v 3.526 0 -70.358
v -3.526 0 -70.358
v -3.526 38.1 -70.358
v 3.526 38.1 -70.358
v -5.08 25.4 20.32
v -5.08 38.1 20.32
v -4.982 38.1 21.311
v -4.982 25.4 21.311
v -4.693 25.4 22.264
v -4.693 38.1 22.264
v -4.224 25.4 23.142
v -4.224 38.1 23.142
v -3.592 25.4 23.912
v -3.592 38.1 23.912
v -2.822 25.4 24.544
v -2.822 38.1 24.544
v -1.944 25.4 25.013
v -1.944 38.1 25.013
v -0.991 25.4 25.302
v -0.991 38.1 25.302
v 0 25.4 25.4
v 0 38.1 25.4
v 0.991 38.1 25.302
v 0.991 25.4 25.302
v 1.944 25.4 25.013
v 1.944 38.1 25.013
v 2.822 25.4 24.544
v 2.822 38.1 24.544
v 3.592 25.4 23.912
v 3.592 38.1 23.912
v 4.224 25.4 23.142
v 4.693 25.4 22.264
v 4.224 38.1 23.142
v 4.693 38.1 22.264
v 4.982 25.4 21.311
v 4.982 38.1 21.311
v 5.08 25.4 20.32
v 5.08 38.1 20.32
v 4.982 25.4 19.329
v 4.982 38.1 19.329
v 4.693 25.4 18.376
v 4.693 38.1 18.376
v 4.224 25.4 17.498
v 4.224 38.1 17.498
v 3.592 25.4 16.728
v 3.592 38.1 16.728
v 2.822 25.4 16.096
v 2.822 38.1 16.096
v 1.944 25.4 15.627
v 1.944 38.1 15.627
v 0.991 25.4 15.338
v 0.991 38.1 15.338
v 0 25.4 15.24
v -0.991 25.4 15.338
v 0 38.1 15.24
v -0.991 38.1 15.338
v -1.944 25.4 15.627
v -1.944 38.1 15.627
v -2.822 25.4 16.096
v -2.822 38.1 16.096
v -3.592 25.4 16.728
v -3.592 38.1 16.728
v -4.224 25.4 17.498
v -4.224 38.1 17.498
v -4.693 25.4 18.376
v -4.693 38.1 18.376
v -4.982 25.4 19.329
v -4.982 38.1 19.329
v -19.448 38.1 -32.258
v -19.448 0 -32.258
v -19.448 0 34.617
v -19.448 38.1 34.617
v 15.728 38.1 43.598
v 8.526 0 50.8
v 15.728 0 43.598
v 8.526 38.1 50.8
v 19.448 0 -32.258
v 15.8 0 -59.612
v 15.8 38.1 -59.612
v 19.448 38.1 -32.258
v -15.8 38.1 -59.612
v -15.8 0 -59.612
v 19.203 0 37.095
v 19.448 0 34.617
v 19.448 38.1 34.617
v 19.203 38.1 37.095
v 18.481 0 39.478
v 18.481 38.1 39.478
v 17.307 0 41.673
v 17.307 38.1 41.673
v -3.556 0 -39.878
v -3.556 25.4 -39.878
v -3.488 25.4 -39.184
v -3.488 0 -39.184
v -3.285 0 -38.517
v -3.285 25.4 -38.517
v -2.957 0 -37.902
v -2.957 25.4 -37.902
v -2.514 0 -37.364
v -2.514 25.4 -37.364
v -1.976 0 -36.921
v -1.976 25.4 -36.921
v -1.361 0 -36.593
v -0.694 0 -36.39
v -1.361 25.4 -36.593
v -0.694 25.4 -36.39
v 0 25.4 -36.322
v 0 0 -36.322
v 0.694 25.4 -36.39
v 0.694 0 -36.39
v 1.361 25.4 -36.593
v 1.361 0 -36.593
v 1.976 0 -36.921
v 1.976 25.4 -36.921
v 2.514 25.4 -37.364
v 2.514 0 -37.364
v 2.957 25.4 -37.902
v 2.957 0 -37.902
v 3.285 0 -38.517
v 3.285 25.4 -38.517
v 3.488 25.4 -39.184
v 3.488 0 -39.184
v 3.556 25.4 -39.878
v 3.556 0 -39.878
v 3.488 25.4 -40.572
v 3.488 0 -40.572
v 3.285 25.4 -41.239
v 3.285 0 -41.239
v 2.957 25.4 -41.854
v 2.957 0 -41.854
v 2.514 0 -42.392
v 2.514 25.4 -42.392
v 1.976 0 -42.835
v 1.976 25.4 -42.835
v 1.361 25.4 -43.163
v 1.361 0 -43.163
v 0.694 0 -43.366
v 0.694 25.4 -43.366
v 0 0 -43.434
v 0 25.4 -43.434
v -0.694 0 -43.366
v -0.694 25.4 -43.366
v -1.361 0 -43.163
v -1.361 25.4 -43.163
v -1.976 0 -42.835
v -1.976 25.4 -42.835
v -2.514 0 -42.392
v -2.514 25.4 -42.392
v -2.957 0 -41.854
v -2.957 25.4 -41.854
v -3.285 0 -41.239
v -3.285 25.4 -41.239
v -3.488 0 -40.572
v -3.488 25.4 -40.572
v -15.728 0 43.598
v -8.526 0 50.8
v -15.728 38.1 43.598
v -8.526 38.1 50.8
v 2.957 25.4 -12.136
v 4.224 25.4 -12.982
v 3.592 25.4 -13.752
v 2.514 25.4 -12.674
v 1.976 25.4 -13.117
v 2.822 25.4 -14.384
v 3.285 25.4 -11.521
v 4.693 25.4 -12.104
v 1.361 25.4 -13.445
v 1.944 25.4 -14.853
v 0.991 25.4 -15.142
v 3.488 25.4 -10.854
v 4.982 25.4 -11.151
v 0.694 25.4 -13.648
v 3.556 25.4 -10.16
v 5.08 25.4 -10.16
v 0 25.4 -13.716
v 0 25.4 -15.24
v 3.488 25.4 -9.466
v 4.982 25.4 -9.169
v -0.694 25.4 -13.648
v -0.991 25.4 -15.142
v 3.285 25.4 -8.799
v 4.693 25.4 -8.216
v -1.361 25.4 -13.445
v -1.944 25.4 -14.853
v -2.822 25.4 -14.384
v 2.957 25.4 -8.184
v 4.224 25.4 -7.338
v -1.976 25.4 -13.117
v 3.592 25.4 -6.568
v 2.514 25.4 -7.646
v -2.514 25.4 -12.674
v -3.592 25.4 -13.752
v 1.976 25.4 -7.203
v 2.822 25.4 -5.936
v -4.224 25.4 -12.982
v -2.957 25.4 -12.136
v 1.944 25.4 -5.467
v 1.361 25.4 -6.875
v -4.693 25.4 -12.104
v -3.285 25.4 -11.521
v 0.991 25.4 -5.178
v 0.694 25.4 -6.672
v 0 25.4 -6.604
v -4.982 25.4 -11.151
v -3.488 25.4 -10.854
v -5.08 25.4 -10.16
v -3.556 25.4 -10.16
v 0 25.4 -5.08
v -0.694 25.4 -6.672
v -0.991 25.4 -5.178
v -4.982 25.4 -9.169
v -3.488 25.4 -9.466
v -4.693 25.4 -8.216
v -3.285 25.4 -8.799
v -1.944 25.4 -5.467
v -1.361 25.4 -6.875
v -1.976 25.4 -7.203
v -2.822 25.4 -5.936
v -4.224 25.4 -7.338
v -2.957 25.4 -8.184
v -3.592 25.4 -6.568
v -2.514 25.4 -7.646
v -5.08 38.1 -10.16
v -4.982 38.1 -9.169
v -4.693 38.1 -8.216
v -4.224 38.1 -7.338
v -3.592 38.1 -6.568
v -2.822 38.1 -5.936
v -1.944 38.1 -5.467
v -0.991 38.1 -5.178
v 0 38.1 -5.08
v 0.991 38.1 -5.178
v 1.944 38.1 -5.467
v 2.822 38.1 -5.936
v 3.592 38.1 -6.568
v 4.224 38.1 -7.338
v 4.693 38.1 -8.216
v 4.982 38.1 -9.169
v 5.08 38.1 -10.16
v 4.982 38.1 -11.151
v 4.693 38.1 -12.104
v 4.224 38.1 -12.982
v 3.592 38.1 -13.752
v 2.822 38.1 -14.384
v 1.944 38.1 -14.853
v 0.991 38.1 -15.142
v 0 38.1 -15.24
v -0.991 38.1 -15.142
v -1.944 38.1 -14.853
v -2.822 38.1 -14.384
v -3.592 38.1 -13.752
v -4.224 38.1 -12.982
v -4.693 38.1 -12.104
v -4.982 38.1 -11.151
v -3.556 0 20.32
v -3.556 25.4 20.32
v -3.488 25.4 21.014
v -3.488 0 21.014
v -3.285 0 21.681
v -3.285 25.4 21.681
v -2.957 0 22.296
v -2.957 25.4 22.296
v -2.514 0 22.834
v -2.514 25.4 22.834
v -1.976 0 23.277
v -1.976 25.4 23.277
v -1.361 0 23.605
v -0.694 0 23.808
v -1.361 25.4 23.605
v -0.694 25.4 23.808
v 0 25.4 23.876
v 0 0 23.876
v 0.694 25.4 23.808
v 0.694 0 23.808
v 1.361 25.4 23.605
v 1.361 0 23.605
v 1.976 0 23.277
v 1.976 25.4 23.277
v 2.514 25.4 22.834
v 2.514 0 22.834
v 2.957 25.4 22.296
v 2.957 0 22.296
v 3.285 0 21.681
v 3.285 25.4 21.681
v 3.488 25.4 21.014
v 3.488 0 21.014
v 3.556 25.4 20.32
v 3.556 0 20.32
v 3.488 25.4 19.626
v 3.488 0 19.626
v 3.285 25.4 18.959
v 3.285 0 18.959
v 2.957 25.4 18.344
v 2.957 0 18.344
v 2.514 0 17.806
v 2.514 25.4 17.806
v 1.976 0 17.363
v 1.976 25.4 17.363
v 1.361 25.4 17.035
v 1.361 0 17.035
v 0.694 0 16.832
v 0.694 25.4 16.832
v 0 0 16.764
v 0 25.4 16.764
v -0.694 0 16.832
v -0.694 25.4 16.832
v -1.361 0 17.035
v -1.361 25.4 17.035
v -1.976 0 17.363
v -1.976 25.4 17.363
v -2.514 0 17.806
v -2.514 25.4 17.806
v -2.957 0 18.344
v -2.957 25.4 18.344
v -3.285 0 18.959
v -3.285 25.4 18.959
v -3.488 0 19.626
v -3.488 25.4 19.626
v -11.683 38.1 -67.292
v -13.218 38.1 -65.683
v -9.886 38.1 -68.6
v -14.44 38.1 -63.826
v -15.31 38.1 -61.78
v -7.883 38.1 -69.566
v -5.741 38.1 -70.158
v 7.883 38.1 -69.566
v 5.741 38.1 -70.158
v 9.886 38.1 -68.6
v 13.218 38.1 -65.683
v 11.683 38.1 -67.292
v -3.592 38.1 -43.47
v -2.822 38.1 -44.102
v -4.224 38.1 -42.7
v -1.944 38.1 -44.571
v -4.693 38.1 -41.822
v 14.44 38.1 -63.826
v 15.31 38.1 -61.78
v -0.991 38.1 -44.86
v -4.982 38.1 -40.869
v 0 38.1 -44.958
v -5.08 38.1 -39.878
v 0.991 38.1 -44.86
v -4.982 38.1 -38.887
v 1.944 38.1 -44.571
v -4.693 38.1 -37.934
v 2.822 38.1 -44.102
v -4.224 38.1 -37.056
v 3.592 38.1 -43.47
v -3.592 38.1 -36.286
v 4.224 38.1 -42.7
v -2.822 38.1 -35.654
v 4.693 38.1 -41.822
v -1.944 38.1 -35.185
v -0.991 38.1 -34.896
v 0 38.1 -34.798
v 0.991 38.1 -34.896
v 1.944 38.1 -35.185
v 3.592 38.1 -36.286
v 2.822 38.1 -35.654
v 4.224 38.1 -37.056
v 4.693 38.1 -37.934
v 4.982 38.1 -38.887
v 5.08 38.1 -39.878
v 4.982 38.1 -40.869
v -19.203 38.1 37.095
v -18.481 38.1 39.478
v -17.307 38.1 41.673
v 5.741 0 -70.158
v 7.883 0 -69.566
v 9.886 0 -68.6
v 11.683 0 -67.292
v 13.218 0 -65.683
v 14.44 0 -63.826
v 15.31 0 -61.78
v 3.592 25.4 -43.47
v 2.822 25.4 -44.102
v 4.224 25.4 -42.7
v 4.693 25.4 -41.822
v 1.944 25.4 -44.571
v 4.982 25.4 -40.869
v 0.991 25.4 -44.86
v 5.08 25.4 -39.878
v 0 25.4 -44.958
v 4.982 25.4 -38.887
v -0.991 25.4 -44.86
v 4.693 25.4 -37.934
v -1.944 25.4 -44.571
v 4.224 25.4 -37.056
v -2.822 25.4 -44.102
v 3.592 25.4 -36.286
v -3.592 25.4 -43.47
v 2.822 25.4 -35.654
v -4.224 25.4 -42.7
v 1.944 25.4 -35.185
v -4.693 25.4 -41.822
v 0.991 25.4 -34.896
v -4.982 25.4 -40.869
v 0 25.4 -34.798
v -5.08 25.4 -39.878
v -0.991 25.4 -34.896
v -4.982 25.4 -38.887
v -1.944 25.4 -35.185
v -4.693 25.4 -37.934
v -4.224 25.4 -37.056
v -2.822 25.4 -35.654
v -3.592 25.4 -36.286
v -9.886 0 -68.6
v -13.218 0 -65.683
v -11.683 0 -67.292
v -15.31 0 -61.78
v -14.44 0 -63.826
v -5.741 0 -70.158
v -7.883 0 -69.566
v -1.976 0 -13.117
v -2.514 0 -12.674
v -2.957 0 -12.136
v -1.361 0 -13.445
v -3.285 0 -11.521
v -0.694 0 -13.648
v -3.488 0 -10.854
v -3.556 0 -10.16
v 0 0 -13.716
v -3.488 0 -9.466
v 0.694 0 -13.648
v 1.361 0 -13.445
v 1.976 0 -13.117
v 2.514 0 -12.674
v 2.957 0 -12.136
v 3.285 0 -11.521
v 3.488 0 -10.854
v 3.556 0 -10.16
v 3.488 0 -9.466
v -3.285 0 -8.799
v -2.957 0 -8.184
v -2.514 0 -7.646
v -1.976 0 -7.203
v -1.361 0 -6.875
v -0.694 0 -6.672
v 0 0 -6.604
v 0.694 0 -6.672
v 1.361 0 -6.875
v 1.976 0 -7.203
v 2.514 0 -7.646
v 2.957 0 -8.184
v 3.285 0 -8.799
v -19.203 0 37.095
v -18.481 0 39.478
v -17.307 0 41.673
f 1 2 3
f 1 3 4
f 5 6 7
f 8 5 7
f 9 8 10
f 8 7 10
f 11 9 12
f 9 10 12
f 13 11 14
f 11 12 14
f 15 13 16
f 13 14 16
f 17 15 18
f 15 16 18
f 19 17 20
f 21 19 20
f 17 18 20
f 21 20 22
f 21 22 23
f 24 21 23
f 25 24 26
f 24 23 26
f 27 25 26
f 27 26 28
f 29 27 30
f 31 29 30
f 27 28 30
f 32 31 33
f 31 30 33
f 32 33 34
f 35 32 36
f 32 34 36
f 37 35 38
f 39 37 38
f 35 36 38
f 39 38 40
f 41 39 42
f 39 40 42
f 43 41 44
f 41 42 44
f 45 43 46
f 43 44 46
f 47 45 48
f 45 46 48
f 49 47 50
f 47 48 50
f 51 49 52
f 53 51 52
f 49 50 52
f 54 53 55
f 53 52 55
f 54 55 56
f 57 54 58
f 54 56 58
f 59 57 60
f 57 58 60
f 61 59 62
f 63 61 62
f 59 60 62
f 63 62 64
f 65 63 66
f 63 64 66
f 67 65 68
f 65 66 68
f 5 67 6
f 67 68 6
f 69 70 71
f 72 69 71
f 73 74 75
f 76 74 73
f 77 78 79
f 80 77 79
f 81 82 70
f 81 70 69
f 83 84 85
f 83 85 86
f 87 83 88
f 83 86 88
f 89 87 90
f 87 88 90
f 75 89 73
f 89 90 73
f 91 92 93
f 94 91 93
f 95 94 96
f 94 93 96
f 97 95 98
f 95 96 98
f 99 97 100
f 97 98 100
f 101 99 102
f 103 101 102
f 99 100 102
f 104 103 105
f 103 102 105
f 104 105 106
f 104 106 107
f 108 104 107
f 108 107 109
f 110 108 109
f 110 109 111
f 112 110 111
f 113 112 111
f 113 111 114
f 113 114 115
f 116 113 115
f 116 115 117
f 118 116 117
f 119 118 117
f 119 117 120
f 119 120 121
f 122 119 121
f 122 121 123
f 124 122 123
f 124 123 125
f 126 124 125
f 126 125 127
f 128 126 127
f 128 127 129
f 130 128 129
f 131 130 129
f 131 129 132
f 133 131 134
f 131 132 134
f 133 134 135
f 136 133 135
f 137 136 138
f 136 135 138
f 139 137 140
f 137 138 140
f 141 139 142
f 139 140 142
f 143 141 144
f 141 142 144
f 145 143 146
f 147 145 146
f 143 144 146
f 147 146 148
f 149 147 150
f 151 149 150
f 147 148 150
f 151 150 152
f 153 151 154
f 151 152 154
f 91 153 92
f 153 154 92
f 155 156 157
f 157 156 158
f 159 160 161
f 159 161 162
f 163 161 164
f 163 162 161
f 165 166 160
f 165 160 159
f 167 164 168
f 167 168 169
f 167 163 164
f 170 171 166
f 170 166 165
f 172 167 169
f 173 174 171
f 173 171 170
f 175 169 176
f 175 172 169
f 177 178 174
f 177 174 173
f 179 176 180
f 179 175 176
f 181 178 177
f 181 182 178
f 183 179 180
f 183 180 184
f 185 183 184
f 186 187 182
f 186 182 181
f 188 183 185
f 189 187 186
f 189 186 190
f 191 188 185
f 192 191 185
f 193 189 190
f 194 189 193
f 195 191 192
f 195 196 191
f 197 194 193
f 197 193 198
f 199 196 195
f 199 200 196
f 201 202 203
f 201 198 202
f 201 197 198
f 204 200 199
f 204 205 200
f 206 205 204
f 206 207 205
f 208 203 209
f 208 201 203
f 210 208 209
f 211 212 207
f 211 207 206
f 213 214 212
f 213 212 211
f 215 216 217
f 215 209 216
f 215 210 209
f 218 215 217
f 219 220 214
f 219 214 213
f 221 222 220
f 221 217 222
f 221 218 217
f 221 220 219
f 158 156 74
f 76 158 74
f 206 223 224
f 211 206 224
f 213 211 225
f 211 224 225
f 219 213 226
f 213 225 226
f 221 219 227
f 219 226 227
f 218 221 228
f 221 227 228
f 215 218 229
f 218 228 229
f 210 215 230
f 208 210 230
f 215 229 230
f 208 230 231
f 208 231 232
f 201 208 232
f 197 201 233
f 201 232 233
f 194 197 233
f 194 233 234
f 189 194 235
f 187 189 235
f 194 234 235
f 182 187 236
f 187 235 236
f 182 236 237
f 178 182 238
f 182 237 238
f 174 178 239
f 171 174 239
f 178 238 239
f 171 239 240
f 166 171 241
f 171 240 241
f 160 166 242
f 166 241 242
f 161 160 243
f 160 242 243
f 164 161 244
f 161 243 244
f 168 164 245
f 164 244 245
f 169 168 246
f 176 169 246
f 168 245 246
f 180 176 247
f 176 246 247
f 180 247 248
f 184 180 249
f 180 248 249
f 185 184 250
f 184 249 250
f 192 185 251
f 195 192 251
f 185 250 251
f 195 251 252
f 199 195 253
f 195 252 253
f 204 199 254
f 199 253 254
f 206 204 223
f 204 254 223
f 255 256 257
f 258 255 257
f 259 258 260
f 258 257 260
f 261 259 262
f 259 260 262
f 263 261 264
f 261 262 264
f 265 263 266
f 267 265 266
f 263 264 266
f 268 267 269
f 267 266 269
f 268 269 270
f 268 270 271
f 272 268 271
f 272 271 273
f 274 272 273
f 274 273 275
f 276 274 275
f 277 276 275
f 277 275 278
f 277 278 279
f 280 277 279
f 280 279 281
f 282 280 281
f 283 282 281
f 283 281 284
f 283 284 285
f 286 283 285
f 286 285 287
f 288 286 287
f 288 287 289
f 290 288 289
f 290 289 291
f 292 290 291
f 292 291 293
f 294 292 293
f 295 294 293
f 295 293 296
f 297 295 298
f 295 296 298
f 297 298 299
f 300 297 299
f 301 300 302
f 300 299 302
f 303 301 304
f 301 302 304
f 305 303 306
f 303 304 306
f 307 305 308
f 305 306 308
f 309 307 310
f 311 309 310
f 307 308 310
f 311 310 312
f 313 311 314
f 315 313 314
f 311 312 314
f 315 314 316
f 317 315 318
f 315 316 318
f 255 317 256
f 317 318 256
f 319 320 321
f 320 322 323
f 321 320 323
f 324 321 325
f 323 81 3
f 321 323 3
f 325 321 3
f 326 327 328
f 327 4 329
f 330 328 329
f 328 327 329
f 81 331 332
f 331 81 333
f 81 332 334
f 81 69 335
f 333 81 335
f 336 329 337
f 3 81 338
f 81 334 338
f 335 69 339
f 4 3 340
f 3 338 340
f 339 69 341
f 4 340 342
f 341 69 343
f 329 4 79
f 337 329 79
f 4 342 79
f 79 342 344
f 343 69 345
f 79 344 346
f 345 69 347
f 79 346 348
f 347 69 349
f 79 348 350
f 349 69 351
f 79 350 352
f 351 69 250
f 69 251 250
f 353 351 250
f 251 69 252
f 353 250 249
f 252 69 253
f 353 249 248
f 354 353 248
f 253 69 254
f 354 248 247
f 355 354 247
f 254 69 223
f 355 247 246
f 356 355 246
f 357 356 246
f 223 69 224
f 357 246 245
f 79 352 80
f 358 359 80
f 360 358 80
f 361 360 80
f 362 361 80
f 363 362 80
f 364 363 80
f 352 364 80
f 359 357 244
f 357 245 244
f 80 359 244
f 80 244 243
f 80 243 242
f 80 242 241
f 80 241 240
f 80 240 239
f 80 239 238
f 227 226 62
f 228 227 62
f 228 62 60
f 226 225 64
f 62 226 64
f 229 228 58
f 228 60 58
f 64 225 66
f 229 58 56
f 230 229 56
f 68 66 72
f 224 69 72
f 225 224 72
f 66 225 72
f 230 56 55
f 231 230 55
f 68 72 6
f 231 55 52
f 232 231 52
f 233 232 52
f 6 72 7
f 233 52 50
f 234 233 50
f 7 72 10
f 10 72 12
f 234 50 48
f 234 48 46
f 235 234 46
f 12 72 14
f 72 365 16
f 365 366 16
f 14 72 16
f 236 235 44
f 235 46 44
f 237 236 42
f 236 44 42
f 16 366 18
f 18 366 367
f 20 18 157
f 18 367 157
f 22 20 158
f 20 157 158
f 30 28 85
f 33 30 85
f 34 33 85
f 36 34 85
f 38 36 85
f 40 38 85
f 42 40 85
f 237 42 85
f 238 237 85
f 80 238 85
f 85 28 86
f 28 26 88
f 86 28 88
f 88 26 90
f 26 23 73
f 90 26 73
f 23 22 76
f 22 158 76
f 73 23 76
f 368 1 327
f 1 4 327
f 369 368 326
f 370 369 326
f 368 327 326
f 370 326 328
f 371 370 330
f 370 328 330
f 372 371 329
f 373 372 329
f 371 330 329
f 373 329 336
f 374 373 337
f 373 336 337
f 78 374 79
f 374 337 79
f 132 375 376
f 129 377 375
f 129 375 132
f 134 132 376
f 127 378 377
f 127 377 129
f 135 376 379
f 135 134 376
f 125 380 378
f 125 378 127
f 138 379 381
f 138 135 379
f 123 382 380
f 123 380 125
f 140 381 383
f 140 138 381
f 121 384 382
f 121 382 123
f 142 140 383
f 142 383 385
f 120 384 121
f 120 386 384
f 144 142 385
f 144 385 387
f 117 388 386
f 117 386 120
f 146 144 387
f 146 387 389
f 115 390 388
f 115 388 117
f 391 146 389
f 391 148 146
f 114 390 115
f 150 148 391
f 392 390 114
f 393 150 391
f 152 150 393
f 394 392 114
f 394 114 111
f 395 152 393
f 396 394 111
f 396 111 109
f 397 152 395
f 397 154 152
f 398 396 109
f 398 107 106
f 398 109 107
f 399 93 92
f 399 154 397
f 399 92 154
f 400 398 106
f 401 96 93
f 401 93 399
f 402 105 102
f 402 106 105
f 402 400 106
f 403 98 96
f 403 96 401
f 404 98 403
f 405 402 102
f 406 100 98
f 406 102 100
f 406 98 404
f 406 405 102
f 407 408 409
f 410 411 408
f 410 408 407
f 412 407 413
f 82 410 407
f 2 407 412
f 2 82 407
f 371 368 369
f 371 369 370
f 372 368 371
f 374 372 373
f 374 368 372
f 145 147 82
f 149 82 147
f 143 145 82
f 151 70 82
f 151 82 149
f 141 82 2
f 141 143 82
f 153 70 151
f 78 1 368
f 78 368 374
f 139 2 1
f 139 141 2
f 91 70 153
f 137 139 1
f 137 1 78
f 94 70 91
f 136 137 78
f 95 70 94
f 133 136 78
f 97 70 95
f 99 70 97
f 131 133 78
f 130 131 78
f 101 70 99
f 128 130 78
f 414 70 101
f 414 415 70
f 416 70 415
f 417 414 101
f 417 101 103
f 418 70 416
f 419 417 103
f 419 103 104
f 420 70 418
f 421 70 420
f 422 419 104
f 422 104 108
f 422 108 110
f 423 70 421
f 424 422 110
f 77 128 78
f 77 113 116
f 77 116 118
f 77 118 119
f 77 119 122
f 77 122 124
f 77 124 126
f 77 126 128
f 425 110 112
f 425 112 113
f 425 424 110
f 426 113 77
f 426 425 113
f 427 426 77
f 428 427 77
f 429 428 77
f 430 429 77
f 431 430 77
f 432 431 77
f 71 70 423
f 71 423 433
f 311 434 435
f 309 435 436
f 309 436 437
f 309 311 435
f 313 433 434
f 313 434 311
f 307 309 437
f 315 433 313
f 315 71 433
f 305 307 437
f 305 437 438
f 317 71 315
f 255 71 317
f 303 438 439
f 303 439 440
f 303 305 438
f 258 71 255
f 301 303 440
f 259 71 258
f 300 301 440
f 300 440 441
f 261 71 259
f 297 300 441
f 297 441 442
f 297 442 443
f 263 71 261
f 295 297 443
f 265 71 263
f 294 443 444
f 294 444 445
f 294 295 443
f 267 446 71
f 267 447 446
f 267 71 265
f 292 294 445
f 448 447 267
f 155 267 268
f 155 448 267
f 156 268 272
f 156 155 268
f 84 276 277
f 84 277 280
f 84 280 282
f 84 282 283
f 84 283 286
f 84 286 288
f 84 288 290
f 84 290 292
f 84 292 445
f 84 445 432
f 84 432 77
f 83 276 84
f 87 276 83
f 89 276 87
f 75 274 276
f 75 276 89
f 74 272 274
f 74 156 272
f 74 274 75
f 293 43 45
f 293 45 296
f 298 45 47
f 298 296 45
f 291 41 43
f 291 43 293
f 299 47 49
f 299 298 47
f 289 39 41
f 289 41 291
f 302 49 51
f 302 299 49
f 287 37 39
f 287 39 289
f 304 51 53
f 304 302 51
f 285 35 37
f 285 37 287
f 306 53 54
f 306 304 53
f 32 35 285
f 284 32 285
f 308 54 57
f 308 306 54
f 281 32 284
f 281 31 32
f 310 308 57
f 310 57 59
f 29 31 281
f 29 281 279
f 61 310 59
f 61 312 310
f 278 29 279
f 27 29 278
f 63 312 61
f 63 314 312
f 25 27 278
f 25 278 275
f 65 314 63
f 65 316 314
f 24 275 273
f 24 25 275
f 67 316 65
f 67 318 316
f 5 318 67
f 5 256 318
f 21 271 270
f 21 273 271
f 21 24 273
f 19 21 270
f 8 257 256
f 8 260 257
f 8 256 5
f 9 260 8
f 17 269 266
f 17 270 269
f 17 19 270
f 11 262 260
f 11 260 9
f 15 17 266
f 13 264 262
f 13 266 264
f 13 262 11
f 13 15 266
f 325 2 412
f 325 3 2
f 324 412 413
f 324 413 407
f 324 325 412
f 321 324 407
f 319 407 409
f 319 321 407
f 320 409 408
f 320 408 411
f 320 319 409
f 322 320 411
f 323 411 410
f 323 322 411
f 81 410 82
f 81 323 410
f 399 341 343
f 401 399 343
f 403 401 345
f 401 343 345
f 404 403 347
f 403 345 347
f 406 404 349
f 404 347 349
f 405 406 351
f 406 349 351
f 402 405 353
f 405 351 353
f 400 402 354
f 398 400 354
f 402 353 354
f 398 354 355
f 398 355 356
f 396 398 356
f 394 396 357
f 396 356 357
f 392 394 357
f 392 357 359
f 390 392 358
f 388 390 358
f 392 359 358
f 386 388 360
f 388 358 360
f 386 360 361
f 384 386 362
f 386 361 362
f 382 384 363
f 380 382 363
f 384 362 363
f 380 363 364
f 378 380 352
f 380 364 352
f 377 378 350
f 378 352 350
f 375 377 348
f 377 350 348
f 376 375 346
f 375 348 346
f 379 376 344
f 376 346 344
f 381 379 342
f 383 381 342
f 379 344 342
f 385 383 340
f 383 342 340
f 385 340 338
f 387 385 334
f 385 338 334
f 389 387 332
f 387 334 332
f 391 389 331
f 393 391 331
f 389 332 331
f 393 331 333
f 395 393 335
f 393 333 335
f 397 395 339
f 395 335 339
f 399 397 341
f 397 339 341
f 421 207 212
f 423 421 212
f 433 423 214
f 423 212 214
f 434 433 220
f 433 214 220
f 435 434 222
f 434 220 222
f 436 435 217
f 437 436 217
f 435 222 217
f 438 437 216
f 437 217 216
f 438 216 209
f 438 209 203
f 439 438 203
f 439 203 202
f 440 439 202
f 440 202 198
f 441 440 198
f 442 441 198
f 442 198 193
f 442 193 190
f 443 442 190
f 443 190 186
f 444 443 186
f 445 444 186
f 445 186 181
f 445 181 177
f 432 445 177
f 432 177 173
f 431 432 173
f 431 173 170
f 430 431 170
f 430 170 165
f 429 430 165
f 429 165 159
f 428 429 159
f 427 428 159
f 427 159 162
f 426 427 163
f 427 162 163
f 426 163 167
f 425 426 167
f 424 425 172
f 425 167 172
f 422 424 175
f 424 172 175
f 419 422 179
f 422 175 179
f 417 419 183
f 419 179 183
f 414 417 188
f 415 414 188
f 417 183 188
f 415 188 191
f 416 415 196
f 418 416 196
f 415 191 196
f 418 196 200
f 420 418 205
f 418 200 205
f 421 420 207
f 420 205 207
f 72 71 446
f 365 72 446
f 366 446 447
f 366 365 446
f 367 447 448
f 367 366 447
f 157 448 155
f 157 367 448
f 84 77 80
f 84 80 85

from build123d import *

# Parameters (mm, degrees)
F0_W       = 38.89502
F0_H       = 121.158
F1_DEPTH   = 38.1
F2_SIZE    = 10.922
F3_R       = 12.7
F4_SIZE2   = 5.08
F4_SIZE    = 38.1
F4_2_SIZE2 = 5.08
F4_2_SIZE  = 38.1
F5_R       = 12.3825
F6_R       = 5.08
F6_R_2     = 3.556
F7_DEPTH   = 12.7
F8_DEPTH   = 38.101


with BuildPart() as f1:
    # F0 (on Front) → F1 (new body)
    with BuildSketch(Plane.XZ):
        with Locations((0, -9.779)):
            Rectangle(F0_W, F0_H)
    extrude(amount=-F1_DEPTH)

    # F2
    f2_edges = [f1.edges().sort_by_distance(p)[0] for p in [
        (19.44751, 19.05, 50.8),
        (-19.44751, 19.05, 50.8),
    ]]
    chamfer(f2_edges, length=F2_SIZE)

    # F3
    f3_edges = [f1.edges().sort_by_distance(p)[0] for p in [
        (19.44751, 19.05, 39.878),
        (-19.44751, 19.05, 39.878),
    ]]
    fillet(f3_edges, radius=F3_R)

    # F4
    f4_edges = [f1.edges().sort_by_distance(p)[0] for p in [
        (-19.44751, 19.05, -70.358),
    ]]
    f4_side = f1.faces().sort_by_distance((-19.44751, 19.05, -17.870256))[0]
    chamfer(f4_edges, length=F4_SIZE, length2=F4_SIZE2, reference=f4_side)

    # F4#2
    f4_2_edges = [f1.edges().sort_by_distance(p)[0] for p in [
        (19.44751, 19.05, -70.358),
    ]]
    f4_2_side = f1.faces().sort_by_distance((19.44751, 19.05, -17.870256))[0]
    chamfer(f4_2_edges, length=F4_2_SIZE, length2=F4_2_SIZE2, reference=f4_2_side)

    # F5
    f5_edges = [f1.edges().sort_by_distance(p)[0] for p in [
        (14.36751, 19.05, -70.358),
        (-14.36751, 19.05, -70.358),
    ]]
    fillet(f5_edges, radius=F5_R)

    # F6 (on face) → F7 (cut)
    with BuildSketch(Plane(origin=(0, 38.1, 0), x_dir=(-1, 0, 0), z_dir=(0, 1, 0))):
        with Locations((0, -39.878)):
            Circle(F6_R)
        with Locations((0, -39.878)):
            Circle(F6_R_2, mode=Mode.SUBTRACT)
        with Locations((0, -10.16)):
            Circle(F6_R)
        with Locations((0, -10.16)):
            Circle(F6_R_2, mode=Mode.SUBTRACT)
        with Locations((0, 20.32)):
            Circle(F6_R)
        with Locations((0, 20.32)):
            Circle(F6_R_2, mode=Mode.SUBTRACT)
    extrude(amount=-F7_DEPTH, mode=Mode.SUBTRACT)

    # F6 (on face) → F8 (cut, through all)
    with BuildSketch(Plane(origin=(0, 38.1, 0), x_dir=(-1, 0, 0), z_dir=(0, 1, 0))):
        with Locations((0, 20.32)):
            Circle(F6_R_2)
        with Locations((0, -10.16)):
            Circle(F6_R_2)
        with Locations((0, -39.878)):
            Circle(F6_R_2)
    extrude(amount=-F8_DEPTH, mode=Mode.SUBTRACT)


solid = f1.part
